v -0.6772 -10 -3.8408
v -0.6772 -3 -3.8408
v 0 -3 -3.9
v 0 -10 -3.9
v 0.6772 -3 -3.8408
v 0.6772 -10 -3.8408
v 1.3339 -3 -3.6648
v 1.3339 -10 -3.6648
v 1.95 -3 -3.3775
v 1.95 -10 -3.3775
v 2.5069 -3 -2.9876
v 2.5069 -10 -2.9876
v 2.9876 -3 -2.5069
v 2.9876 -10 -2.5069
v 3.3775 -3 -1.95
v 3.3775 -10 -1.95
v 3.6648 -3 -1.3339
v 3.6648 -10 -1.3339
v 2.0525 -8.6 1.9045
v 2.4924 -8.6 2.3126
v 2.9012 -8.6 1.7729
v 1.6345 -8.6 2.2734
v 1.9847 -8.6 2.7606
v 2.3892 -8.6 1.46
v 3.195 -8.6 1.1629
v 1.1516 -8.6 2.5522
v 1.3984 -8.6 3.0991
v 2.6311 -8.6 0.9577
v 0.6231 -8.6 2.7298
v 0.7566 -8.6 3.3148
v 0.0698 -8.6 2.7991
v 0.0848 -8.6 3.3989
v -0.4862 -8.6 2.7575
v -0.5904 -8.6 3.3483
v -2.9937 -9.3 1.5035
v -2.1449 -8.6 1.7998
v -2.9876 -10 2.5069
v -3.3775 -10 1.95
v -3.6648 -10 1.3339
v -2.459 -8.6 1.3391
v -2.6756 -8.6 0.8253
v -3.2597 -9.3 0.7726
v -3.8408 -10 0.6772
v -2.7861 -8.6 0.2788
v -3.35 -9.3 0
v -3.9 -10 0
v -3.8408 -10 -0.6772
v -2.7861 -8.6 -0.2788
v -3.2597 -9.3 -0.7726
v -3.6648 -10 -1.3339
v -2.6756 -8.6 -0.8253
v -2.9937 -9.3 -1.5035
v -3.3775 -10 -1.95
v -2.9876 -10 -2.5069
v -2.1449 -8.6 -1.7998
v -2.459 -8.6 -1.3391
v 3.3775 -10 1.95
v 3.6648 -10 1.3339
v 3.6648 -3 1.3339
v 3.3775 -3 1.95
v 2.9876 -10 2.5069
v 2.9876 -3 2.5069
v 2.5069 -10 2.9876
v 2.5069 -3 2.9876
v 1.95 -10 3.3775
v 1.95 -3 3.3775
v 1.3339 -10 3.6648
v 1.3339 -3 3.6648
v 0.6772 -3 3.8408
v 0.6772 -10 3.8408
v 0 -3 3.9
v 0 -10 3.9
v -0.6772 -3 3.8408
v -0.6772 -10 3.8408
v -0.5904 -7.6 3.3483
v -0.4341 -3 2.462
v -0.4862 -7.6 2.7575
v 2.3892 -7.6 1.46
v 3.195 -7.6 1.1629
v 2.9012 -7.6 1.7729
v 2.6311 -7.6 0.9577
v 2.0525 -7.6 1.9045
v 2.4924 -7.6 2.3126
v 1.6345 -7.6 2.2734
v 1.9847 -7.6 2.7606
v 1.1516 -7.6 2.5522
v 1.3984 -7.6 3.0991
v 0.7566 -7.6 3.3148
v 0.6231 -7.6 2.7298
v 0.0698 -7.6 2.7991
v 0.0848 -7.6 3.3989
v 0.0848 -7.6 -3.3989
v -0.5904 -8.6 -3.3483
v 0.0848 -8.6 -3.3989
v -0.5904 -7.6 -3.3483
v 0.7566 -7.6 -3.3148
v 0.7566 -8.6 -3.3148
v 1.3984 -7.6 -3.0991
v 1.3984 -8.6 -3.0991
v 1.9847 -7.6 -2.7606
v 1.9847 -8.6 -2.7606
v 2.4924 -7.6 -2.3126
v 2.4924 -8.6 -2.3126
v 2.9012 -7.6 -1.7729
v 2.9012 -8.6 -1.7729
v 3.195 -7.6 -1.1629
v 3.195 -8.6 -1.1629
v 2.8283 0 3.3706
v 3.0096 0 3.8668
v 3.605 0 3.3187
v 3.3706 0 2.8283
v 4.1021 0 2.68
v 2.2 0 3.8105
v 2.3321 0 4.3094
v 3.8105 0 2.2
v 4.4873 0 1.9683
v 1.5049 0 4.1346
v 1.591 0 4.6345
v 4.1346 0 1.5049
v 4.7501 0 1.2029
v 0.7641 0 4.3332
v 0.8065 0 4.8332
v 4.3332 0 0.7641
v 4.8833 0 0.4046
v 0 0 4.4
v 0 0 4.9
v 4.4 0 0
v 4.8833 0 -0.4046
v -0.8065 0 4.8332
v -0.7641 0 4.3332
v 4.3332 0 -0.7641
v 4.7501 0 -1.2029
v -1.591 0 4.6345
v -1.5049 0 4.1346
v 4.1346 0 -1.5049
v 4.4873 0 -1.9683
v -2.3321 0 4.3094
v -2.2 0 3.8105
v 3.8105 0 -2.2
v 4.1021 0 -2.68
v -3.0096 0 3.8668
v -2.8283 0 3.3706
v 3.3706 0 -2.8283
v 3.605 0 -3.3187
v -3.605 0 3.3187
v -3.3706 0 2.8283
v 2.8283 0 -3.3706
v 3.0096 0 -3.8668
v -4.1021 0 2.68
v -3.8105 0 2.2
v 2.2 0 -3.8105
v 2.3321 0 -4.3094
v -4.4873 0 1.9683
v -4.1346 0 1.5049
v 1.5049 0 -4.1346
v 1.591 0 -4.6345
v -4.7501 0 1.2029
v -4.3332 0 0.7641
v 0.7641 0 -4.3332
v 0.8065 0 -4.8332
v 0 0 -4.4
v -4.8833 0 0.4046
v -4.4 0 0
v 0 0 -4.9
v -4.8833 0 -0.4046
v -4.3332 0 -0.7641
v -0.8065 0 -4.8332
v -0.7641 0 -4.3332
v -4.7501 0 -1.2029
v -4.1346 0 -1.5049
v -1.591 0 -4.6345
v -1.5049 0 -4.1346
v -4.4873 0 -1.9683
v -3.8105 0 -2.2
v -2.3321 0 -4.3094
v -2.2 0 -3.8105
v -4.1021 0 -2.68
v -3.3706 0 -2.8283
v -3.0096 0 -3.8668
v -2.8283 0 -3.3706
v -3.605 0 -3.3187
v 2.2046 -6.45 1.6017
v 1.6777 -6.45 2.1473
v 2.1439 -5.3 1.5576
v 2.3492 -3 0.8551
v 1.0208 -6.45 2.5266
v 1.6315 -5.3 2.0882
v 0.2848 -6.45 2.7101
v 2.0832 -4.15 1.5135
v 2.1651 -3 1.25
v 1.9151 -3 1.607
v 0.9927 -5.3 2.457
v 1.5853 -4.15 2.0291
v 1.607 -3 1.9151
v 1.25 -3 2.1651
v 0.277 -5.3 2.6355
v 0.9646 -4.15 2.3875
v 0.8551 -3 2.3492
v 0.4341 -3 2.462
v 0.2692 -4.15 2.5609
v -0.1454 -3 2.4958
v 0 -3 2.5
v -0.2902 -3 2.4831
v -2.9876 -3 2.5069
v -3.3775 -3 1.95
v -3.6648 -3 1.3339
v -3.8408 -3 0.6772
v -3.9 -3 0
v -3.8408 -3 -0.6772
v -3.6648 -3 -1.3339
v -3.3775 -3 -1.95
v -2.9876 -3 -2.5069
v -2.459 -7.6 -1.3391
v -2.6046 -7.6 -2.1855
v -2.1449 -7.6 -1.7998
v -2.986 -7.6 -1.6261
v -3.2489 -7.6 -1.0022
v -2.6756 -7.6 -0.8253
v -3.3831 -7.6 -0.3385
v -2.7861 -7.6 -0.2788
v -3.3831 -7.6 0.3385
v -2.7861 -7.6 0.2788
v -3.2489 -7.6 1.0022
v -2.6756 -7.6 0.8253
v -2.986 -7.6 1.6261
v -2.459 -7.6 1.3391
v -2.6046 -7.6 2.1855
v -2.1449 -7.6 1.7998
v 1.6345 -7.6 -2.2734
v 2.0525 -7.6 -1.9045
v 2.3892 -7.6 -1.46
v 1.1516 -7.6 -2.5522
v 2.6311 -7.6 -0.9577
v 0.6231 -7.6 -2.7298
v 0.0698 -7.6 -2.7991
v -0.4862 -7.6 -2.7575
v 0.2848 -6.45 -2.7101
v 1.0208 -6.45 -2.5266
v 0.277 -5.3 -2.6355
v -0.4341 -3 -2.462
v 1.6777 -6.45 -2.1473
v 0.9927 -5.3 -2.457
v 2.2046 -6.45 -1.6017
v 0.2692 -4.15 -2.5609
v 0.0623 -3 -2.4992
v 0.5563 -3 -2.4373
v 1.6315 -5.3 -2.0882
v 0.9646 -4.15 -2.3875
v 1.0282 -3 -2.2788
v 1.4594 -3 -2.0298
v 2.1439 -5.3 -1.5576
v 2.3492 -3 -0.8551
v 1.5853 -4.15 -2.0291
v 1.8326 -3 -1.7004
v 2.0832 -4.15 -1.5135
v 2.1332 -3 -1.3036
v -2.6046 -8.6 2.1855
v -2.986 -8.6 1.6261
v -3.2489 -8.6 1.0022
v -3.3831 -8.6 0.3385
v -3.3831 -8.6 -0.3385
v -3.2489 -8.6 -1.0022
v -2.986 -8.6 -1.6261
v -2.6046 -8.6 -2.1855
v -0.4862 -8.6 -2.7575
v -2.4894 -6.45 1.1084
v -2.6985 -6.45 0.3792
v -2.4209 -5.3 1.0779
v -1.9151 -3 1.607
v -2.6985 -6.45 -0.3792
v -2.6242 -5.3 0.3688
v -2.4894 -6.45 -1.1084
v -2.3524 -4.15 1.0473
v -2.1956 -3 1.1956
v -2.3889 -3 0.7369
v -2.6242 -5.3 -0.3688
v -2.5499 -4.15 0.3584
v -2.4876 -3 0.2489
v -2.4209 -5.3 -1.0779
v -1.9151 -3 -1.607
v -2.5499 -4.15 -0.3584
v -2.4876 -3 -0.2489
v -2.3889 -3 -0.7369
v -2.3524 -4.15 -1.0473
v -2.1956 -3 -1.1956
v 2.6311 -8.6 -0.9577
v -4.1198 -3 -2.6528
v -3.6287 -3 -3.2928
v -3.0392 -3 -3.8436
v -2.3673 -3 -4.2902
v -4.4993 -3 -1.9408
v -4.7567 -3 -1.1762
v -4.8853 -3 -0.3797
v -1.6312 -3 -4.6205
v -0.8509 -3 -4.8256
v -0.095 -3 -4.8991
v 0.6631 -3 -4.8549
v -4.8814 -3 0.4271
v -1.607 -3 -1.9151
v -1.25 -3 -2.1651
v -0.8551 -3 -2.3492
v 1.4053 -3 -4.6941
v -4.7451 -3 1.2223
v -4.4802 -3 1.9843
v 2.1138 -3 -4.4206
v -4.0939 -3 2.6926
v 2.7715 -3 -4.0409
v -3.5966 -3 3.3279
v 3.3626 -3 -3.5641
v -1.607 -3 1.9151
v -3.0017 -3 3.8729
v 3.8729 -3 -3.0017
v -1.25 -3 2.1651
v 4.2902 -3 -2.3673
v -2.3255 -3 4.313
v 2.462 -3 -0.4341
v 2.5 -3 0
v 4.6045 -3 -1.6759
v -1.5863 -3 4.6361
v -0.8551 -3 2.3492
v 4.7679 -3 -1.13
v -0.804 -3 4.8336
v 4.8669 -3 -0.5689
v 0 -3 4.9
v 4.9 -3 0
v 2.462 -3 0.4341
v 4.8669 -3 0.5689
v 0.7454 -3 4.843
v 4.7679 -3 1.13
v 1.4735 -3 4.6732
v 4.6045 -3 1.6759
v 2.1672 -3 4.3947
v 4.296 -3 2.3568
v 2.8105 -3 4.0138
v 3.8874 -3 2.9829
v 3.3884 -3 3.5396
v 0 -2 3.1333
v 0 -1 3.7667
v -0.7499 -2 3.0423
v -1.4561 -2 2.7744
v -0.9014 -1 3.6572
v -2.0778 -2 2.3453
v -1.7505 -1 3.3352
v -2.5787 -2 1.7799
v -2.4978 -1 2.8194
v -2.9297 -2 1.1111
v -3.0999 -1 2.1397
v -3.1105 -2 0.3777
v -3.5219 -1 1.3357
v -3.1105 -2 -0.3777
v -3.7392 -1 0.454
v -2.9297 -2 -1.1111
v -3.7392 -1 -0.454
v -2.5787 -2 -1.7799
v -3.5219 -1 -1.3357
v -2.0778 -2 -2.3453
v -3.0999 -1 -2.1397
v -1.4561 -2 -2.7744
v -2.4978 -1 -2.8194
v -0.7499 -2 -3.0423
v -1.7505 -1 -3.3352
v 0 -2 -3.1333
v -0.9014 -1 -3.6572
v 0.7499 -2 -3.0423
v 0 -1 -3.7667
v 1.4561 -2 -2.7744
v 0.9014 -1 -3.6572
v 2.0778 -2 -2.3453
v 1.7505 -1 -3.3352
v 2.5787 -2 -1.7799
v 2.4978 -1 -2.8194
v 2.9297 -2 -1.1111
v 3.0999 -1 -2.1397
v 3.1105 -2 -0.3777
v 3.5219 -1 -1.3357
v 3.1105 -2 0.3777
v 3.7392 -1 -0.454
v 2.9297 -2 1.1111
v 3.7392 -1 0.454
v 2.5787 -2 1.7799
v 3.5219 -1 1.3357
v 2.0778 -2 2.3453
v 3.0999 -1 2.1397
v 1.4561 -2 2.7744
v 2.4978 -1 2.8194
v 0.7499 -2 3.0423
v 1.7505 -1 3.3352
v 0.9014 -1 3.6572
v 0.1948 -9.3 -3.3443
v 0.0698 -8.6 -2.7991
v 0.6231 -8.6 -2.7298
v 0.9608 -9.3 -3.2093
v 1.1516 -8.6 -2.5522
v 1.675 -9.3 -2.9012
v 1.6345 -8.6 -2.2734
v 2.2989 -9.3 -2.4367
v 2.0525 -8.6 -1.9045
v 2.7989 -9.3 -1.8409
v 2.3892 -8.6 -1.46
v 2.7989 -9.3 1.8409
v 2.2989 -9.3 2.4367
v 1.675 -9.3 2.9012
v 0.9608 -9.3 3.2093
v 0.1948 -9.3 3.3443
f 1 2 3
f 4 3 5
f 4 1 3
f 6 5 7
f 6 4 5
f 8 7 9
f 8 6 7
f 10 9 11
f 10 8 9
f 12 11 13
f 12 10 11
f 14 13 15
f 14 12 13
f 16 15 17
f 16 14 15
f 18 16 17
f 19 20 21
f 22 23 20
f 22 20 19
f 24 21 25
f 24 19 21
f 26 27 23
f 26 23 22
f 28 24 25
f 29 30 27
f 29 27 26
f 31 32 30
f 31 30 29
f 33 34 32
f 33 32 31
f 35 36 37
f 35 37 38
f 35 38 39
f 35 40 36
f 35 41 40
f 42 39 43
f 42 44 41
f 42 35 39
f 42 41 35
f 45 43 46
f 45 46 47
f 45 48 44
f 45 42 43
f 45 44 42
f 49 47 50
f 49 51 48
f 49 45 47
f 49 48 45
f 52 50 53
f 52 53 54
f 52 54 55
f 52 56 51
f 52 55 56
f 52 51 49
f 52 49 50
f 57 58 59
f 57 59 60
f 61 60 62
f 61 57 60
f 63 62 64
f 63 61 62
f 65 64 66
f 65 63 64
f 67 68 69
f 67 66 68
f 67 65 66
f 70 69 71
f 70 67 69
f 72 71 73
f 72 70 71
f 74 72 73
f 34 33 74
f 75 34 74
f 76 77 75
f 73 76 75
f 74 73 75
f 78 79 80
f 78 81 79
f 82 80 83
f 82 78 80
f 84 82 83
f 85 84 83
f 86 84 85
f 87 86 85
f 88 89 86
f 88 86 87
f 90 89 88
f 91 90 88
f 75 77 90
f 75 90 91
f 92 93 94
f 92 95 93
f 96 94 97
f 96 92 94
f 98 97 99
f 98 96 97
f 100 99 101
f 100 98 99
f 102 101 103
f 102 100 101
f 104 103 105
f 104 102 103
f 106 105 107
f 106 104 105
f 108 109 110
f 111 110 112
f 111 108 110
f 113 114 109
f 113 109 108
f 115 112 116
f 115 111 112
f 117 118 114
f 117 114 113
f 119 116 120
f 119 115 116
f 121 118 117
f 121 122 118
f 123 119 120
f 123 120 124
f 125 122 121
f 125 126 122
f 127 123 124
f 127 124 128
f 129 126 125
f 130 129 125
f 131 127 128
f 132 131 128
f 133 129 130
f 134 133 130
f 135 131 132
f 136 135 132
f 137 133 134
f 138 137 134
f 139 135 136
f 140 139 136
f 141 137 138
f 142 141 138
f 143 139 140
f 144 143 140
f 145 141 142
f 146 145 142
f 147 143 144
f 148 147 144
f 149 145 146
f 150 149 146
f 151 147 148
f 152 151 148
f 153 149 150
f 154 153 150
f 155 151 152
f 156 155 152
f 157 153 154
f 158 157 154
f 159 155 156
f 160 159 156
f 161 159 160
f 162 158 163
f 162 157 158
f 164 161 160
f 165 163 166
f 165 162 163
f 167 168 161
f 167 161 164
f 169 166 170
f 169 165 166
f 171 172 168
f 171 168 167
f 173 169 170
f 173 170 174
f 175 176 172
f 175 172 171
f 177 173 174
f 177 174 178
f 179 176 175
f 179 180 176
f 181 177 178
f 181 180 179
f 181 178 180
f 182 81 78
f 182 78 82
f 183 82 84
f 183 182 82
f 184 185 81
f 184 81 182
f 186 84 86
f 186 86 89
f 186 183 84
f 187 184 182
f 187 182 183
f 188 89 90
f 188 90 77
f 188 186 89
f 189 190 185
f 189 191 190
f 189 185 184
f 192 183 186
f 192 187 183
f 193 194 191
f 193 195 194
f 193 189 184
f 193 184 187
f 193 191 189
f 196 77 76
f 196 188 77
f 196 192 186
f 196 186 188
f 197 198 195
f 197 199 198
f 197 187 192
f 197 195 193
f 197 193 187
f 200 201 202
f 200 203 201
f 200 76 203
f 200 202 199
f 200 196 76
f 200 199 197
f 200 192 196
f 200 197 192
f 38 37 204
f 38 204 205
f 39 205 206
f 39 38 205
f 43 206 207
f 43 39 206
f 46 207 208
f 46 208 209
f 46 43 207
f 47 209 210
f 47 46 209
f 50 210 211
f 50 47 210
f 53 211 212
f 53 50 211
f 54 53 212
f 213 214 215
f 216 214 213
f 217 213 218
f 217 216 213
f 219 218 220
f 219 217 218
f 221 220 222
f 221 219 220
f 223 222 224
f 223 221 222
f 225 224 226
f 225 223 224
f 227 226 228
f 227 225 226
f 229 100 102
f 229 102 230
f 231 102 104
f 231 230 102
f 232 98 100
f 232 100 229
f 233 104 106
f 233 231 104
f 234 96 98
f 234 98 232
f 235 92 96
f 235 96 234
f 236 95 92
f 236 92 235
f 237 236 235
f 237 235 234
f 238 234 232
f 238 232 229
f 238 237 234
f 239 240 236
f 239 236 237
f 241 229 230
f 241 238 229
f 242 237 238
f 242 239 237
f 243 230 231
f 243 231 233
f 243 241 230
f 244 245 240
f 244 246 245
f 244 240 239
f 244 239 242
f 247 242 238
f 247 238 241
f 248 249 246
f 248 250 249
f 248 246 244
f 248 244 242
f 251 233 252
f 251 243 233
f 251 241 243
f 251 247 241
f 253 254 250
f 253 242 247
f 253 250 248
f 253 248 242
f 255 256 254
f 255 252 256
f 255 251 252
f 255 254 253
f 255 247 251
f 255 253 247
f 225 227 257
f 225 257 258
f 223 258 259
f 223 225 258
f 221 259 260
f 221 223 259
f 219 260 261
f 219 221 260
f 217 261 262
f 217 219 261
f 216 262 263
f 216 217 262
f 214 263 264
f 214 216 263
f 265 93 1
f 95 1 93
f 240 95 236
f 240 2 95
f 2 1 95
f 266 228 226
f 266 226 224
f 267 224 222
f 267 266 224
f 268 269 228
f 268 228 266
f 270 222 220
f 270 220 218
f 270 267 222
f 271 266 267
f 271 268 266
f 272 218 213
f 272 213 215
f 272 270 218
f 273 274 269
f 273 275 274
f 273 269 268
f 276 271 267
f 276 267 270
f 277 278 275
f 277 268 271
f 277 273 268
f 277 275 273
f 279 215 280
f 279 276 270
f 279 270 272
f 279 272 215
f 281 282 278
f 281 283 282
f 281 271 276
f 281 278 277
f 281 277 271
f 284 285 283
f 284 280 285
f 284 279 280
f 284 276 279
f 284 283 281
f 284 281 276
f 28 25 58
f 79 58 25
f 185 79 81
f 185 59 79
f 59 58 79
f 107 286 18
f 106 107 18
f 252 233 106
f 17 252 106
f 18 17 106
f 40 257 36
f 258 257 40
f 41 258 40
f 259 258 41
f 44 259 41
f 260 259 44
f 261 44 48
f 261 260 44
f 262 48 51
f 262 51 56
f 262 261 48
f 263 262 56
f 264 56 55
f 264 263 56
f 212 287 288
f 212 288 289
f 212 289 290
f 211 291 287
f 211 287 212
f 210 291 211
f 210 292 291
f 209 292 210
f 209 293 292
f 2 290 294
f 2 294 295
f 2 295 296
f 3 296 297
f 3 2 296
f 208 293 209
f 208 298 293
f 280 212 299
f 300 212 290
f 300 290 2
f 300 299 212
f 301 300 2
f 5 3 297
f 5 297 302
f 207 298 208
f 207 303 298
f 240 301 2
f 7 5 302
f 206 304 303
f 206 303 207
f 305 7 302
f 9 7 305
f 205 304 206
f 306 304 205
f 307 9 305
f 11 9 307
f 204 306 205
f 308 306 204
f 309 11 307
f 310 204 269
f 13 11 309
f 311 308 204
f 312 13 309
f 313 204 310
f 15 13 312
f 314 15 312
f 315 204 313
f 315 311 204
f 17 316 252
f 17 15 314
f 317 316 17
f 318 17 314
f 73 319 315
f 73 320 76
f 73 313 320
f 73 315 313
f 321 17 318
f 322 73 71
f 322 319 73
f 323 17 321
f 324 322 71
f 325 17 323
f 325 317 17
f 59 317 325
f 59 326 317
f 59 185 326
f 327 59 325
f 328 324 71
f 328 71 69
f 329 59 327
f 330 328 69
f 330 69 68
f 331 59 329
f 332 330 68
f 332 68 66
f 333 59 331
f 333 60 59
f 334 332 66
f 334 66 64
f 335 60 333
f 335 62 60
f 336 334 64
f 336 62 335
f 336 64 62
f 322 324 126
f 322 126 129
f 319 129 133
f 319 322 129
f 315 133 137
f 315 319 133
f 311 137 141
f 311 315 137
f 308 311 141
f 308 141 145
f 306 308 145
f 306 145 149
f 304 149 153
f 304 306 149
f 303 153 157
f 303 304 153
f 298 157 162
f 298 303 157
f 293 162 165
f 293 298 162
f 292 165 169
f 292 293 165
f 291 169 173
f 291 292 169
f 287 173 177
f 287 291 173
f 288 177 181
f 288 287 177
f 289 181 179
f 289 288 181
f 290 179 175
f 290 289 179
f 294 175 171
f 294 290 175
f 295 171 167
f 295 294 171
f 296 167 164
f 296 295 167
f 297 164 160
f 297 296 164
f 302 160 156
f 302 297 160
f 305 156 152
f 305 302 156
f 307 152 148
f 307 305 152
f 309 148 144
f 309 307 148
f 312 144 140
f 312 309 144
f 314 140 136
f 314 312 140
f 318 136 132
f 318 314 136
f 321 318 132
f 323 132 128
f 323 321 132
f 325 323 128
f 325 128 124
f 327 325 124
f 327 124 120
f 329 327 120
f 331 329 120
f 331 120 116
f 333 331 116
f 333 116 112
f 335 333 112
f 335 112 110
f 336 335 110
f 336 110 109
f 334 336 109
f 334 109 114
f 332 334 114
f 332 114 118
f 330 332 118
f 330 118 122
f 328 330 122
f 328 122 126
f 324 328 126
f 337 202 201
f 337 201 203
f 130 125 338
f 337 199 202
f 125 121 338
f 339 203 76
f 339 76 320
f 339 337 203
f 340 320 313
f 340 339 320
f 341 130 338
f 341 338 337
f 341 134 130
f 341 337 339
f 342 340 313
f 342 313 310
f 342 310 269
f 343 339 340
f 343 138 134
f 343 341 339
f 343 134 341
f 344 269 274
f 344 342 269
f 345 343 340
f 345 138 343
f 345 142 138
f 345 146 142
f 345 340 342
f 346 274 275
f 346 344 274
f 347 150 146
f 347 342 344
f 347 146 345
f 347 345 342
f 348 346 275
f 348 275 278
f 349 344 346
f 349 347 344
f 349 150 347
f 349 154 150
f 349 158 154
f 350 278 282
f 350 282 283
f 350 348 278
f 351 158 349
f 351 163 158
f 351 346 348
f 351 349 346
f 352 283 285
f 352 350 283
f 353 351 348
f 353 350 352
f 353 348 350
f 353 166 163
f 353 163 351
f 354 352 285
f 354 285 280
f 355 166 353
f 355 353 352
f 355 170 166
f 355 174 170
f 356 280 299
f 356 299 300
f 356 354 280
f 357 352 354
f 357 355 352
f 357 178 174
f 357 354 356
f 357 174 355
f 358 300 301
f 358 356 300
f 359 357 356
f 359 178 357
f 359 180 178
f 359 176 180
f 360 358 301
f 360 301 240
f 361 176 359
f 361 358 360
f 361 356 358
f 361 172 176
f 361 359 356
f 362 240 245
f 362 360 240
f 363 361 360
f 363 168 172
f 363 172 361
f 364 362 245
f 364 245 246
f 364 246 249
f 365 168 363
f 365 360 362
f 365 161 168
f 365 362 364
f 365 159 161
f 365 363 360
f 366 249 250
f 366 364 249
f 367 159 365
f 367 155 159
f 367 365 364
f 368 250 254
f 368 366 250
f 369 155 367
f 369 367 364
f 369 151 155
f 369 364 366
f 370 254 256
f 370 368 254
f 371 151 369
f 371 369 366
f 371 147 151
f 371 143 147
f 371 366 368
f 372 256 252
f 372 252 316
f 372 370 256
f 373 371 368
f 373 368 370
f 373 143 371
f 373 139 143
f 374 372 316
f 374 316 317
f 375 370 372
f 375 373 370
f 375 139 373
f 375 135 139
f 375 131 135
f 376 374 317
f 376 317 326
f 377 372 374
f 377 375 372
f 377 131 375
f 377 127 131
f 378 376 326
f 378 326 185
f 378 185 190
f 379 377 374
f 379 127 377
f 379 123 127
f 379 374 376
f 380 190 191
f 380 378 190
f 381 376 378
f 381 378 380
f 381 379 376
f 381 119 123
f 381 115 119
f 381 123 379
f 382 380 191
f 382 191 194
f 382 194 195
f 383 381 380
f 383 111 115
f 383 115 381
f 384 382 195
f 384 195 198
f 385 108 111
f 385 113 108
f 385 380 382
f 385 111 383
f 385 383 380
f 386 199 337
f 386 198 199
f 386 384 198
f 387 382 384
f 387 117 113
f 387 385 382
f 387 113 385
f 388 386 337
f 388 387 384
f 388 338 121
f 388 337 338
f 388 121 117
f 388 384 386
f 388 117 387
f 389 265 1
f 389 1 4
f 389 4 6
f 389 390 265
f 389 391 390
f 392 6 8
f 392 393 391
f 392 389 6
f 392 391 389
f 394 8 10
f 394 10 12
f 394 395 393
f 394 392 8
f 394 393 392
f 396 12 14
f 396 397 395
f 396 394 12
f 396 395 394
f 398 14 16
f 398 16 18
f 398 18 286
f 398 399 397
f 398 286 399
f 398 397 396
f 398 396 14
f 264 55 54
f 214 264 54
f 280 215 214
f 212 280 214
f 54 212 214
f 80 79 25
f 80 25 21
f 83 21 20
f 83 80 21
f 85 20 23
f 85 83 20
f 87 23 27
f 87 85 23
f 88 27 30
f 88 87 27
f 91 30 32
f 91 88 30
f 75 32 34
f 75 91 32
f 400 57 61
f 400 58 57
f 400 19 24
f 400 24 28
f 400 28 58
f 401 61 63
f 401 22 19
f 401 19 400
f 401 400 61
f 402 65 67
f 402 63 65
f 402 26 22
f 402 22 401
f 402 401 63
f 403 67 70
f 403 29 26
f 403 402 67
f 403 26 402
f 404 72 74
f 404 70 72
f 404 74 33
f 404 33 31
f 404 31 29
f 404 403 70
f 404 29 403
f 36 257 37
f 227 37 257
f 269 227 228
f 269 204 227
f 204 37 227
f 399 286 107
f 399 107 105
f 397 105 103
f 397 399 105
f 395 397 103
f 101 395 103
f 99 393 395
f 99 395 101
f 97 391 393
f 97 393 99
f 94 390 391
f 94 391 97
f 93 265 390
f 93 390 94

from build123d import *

# Parameters (mm, degrees)
F3_DEPTH = 10


with BuildPart() as f1:
    # F0 (on Right) → F1 (revolve)
    with BuildSketch(Plane.YZ):
        Polygon((-7.6, 2.8), (-3, 2.5), (0, 4.4), (0, 4.9), (-3, 4.9), (-3, 3.9), (-10, 3.9), (-8.6, 2.8), (-8.6, 3.4), (-7.6, 3.4), align=None)
    revolve(axis=Axis((0, -6.9740121253, 0), (0, -1, 0)))

    # F2 (on face) → F3 (cut)
    with BuildSketch(Plane.XZ.offset(3)):
        with BuildLine():
            Line((-2.9875733282, 2.5068716778), (0, 0))
            Line((0, 0), (-0.6772278929, 3.8407502367))
            ThreePointArc((-0.6772278929, 3.8407502367), (-1.95, 3.3774990748), (-2.9875733282, 2.5068716778))
        make_face()
        with BuildLine():
            Line((3.6648012211, 1.333878559), (0, 0))
            Line((0, 0), (3.9, 0))
            ThreePointArc((3.9, 0), (3.8407502367, 0.6772278929), (3.6648012211, 1.333878559))
        make_face()
        with BuildLine():
            Line((3.9, 0), (0, 0))
            Line((0, 0), (3.6648012211, -1.333878559))
            ThreePointArc((3.6648012211, -1.333878559), (3.8407502367, -0.6772278929), (3.9, 0))
        make_face()
        with BuildLine():
            Line((-0.6772278929, -3.8407502367), (0, 0))
            Line((0, 0), (-2.9875733282, -2.5068716778))
            ThreePointArc((-2.9875733282, -2.5068716778), (-1.95, -3.3774990748), (-0.6772278929, -3.8407502367))
        make_face()
        with BuildLine():
            Line((-0.8508760706, 4.8255579898), (-0.6772278929, 3.8407502367))
            ThreePointArc((-0.6772278929, 3.8407502367), (1.95, 3.3774990748), (3.6648012211, 1.333878559))
            Line((3.6648012211, 1.333878559), (4.6044938419, 1.6758987023))
            ThreePointArc((4.6044938419, 1.6758987023), (2.45, 4.2435244785), (-0.8508760706, 4.8255579898))
        make_face()
        with BuildLine():
            ThreePointArc((3.6648012211, 1.333878559), (3.8407502367, 0.6772278929), (3.9, 0))
            Line((3.9, 0), (4.9, 0))
            ThreePointArc((4.9, 0), (4.8255579898, 0.8508760706), (4.6044938419, 1.6758987023))
            Line((4.6044938419, 1.6758987023), (3.6648012211, 1.333878559))
        make_face()
        with BuildLine():
            Line((4.9, 0), (3.9, 0))
            ThreePointArc((3.9, 0), (3.8407502367, -0.6772278929), (3.6648012211, -1.333878559))
            Line((3.6648012211, -1.333878559), (4.6044938419, -1.6758987023))
            ThreePointArc((4.6044938419, -1.6758987023), (4.8255579898, -0.8508760706), (4.9, 0))
        make_face()
        with BuildLine():
            ThreePointArc((3.6648012211, -1.333878559), (1.95, -3.3774990748), (-0.6772278929, -3.8407502367))
            Line((-0.6772278929, -3.8407502367), (-0.8508760706, -4.8255579898))
            ThreePointArc((-0.8508760706, -4.8255579898), (2.45, -4.2435244785), (4.6044938419, -1.6758987023))
            Line((4.6044938419, -1.6758987023), (3.6648012211, -1.333878559))
        make_face()
    extrude(amount=F3_DEPTH, mode=Mode.SUBTRACT)


solid = f1.part
